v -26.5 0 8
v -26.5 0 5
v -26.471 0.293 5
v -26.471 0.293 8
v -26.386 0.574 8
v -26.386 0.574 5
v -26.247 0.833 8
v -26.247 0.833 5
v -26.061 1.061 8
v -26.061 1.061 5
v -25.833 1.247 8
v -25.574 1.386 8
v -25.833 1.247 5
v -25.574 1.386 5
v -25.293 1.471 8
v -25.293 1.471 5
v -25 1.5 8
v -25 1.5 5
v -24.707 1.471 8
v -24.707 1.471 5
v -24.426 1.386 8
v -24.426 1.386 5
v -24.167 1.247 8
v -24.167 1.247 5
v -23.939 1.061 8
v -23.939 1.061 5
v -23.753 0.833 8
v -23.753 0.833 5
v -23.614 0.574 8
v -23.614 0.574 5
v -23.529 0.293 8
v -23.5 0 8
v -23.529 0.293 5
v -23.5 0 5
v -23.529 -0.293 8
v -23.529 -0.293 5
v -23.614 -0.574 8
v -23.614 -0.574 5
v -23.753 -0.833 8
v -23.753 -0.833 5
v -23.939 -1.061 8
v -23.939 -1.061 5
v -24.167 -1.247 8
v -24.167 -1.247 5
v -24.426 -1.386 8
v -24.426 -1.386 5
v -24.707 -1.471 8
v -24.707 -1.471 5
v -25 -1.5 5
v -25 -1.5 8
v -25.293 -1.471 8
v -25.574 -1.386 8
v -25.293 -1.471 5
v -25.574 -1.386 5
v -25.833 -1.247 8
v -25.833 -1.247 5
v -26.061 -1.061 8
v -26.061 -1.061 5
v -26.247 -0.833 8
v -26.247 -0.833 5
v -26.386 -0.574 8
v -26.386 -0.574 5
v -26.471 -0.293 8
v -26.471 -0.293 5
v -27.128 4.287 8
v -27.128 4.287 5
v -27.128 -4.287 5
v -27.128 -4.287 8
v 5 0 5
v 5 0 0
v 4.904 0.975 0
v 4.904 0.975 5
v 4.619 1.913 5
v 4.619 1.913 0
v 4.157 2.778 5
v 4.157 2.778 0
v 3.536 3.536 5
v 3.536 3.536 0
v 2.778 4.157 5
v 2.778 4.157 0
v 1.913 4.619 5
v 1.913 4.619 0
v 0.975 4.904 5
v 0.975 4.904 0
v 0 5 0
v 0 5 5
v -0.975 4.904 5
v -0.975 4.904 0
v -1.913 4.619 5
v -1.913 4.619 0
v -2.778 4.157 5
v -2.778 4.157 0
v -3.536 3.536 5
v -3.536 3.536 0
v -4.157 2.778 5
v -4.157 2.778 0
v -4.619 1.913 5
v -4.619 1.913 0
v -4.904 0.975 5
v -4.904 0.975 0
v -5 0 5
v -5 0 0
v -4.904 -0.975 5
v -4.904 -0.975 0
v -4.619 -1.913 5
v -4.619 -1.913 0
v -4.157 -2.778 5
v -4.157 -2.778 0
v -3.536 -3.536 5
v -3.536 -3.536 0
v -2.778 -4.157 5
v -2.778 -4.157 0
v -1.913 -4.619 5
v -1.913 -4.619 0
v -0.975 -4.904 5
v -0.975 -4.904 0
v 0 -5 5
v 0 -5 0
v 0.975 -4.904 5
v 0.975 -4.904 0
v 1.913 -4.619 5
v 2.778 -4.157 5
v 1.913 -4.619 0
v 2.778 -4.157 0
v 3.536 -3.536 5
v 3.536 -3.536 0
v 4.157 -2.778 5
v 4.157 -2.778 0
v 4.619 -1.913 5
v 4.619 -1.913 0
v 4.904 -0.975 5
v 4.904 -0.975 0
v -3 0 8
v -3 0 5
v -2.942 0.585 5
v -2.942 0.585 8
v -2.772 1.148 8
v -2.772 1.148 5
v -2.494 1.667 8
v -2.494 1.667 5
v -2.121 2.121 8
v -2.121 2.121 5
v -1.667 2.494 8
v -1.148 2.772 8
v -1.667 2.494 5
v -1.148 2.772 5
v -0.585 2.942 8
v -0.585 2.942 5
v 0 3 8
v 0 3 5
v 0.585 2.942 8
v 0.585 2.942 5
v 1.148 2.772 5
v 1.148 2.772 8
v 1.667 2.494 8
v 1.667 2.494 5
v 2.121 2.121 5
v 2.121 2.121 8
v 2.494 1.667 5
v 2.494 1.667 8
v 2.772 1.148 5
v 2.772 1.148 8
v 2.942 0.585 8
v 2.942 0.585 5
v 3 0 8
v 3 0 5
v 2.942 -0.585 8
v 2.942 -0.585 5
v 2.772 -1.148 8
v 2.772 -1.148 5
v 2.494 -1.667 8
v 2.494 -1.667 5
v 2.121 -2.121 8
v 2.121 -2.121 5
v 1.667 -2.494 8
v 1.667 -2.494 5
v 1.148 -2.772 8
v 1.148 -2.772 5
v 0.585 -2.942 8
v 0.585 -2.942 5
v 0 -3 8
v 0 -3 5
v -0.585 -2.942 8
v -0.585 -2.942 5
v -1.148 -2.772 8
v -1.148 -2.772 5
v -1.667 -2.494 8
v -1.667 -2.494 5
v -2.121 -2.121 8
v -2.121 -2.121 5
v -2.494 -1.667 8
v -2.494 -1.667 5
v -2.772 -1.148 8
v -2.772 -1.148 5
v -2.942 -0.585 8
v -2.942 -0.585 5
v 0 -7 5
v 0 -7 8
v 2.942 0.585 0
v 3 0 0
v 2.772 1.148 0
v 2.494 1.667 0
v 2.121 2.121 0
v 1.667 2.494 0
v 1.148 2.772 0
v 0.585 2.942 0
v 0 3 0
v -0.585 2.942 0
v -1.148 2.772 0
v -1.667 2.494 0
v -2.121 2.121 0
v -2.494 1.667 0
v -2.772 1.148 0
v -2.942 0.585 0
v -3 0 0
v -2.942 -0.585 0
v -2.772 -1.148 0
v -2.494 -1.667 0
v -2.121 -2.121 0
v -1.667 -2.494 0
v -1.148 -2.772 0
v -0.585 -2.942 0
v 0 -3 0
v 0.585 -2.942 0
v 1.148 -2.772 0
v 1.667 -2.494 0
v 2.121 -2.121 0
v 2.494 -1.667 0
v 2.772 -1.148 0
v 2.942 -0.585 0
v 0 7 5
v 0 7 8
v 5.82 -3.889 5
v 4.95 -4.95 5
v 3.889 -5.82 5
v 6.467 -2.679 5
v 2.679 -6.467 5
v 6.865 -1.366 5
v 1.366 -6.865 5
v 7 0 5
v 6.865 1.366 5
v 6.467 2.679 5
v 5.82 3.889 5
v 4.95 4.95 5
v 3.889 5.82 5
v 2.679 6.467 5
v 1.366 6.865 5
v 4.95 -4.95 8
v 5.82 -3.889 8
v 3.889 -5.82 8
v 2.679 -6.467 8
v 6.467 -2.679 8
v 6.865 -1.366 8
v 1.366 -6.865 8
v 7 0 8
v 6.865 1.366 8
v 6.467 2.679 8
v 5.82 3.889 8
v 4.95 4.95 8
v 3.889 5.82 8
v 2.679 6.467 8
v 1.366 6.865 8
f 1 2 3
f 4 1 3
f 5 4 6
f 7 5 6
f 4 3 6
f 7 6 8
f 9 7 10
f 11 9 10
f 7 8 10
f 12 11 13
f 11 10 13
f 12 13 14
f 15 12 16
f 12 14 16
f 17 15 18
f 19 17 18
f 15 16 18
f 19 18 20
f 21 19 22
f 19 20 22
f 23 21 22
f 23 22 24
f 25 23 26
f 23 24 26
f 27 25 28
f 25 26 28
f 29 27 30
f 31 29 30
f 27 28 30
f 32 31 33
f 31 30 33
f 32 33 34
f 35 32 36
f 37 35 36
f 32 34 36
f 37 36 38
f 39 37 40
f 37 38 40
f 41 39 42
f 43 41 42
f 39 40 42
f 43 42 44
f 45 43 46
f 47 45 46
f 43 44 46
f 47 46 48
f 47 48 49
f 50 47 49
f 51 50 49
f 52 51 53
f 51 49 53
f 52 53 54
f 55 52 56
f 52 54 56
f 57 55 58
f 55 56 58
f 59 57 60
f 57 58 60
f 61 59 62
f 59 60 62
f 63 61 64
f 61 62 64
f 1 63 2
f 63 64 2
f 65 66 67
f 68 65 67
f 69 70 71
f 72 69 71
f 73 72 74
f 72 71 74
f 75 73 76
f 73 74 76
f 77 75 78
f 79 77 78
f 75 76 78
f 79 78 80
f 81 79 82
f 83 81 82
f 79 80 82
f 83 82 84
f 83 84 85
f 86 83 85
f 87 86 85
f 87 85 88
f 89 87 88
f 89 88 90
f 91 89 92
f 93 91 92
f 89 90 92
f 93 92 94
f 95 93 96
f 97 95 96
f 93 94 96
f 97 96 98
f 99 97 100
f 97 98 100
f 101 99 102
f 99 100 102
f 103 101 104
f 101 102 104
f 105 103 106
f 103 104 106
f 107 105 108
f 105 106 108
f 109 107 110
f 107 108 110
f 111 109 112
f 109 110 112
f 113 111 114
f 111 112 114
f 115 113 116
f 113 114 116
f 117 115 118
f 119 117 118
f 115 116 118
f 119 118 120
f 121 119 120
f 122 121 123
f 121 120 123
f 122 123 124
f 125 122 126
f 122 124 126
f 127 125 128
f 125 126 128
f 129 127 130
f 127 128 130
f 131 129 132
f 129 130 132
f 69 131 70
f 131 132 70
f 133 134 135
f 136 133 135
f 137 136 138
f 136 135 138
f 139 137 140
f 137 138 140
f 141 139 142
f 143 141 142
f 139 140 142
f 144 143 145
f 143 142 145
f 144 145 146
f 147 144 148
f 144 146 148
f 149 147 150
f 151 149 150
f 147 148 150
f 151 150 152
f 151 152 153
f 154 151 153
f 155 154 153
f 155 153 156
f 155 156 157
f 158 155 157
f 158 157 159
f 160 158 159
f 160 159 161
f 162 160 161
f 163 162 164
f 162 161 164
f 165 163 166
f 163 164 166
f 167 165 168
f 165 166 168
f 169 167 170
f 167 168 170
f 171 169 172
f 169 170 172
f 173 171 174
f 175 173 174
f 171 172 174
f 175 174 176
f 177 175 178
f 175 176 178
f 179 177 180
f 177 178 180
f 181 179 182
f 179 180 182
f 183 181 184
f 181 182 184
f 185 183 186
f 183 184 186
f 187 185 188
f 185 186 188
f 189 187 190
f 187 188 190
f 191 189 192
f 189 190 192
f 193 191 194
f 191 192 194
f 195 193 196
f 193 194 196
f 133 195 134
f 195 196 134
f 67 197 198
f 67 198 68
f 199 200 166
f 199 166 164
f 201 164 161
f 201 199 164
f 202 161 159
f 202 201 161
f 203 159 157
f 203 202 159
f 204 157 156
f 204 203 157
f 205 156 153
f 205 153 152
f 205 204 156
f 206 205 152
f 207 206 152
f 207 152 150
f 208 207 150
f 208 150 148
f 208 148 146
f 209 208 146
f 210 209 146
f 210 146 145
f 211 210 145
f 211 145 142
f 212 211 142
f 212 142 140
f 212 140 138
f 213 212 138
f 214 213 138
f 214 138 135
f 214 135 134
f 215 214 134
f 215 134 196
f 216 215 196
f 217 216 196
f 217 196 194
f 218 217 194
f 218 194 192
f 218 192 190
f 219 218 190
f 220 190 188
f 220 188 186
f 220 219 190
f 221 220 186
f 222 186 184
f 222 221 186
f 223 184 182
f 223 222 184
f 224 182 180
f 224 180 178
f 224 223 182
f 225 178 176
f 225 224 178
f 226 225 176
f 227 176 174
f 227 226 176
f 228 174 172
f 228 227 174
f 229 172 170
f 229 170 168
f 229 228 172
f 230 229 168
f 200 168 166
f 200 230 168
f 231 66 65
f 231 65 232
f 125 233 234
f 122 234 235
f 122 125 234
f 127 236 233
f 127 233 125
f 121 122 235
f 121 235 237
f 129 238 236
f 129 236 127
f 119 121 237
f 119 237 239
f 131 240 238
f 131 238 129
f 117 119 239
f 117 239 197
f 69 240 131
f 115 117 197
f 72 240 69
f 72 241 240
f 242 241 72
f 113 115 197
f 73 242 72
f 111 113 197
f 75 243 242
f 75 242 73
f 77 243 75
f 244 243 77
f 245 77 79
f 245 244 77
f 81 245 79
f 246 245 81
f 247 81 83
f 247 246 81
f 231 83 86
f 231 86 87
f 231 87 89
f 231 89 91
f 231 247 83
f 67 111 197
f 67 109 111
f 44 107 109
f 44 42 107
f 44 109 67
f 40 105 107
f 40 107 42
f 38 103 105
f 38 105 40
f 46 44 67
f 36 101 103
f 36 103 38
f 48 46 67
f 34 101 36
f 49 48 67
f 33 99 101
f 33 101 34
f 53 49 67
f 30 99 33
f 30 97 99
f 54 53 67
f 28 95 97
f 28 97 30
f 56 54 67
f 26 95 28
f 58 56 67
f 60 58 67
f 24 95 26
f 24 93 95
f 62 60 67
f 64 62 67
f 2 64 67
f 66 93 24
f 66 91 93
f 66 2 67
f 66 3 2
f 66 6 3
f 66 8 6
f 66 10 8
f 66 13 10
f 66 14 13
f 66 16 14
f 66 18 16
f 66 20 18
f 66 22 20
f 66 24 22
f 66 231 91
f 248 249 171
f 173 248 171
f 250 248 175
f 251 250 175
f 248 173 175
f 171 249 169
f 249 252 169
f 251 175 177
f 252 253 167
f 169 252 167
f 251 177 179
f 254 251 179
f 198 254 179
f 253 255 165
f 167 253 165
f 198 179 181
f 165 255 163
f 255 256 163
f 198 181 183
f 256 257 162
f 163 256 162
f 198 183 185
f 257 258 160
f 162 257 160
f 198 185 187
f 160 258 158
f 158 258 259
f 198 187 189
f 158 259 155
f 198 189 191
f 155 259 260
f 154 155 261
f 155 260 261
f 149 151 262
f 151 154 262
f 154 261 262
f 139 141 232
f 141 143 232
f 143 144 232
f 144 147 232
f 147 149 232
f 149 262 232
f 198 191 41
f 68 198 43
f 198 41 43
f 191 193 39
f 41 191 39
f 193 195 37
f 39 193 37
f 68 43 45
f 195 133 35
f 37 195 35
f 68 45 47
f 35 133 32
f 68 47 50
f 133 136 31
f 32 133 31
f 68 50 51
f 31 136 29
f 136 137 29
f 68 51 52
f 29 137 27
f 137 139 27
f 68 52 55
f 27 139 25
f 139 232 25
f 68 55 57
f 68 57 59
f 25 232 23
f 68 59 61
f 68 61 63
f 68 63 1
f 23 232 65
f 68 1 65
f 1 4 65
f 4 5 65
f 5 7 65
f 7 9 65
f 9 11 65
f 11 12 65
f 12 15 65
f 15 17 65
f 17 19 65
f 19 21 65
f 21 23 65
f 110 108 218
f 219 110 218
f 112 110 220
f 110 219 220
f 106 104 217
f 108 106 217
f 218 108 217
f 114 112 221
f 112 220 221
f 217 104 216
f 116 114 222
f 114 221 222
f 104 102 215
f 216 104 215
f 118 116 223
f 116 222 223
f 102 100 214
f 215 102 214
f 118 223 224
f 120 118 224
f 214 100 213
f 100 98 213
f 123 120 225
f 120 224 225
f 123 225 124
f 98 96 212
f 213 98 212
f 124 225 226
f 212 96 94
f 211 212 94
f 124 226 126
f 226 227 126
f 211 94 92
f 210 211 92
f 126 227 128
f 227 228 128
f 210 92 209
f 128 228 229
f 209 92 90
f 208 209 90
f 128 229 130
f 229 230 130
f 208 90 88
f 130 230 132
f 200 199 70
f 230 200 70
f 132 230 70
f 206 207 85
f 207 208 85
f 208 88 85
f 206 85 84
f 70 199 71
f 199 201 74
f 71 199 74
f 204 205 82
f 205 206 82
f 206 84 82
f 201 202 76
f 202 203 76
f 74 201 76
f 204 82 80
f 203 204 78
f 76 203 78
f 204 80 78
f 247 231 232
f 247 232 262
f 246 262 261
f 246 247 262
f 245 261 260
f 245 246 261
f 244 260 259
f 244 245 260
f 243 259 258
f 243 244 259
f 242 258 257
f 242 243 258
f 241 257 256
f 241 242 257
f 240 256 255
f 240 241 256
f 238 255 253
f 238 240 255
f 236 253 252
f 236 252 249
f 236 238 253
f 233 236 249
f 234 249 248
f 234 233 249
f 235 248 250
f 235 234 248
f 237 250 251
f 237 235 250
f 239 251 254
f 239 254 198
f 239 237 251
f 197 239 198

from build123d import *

# Parameters (mm, degrees)
SKETCH1_R           = 5
SKETCH1_R_2         = 3
BOSS_EXTRUDE1_DEPTH = 5
BOSS_EXTRUDE2_DEPTH = 3
SKETCH3_R           = 1.5
CUT_EXTRUDE1_DEPTH  = 3
SKETCH4_R           = 3
CUT_EXTRUDE2_DEPTH  = 3
CUT_EXTRUDE3_DEPTH  = 10


with BuildPart() as part:
    # Sketch1 → Boss-Extrude1 (new body)
    with BuildSketch(Plane.XY):
        Circle(SKETCH1_R)
        Circle(SKETCH1_R_2, mode=Mode.SUBTRACT)
    extrude(amount=BOSS_EXTRUDE1_DEPTH)

    # Sketch2 → Boss-Extrude2 (add)
    with BuildSketch(Plane.XY.offset(5)):
        with BuildLine():
            Line((-30, 4), (0, 7))
            ThreePointArc((0, 7), (7, 0), (0, -7))
            Line((0, -7), (-30, -4))
            ThreePointArc((-30, -4), (-34, 0), (-30, 4))
        make_face()
    extrude(amount=BOSS_EXTRUDE2_DEPTH)

    # Sketch3 → Cut-Extrude1 (cut)
    with BuildSketch(Plane(origin=(0, 0, 5), x_dir=(-1, 0, 0), z_dir=(0, 0, -1))):
        with Locations((25, 0)):
            Circle(SKETCH3_R)
    extrude(amount=-CUT_EXTRUDE1_DEPTH, mode=Mode.SUBTRACT)

    # Sketch4 → Cut-Extrude2 (cut)
    with BuildSketch(Plane(origin=(0, 0, 5), x_dir=(-1, 0, 0), z_dir=(0, 0, -1))):
        Circle(SKETCH4_R)
    extrude(amount=-CUT_EXTRUDE2_DEPTH, mode=Mode.SUBTRACT)

    # Sketch5 → Cut-Extrude3 (cut)
    with BuildSketch(Plane(origin=(0, 0, 5), x_dir=(-1, 0, 0), z_dir=(0, 0, -1))):
        with BuildLine():
            Line((27.128027058, 4.287197294), (27.128027058, 0))
            Line((27.128027058, 0), (27.128027058, -4.287197294))
            Line((27.128027058, -4.287197294), (30, -4))
            ThreePointArc((30, -4), (34, 0), (30, 4))
            Line((30, 4), (27.128027058, 4.287197294))
        make_face()
    extrude(amount=-CUT_EXTRUDE3_DEPTH, mode=Mode.SUBTRACT)


solid = part.part
